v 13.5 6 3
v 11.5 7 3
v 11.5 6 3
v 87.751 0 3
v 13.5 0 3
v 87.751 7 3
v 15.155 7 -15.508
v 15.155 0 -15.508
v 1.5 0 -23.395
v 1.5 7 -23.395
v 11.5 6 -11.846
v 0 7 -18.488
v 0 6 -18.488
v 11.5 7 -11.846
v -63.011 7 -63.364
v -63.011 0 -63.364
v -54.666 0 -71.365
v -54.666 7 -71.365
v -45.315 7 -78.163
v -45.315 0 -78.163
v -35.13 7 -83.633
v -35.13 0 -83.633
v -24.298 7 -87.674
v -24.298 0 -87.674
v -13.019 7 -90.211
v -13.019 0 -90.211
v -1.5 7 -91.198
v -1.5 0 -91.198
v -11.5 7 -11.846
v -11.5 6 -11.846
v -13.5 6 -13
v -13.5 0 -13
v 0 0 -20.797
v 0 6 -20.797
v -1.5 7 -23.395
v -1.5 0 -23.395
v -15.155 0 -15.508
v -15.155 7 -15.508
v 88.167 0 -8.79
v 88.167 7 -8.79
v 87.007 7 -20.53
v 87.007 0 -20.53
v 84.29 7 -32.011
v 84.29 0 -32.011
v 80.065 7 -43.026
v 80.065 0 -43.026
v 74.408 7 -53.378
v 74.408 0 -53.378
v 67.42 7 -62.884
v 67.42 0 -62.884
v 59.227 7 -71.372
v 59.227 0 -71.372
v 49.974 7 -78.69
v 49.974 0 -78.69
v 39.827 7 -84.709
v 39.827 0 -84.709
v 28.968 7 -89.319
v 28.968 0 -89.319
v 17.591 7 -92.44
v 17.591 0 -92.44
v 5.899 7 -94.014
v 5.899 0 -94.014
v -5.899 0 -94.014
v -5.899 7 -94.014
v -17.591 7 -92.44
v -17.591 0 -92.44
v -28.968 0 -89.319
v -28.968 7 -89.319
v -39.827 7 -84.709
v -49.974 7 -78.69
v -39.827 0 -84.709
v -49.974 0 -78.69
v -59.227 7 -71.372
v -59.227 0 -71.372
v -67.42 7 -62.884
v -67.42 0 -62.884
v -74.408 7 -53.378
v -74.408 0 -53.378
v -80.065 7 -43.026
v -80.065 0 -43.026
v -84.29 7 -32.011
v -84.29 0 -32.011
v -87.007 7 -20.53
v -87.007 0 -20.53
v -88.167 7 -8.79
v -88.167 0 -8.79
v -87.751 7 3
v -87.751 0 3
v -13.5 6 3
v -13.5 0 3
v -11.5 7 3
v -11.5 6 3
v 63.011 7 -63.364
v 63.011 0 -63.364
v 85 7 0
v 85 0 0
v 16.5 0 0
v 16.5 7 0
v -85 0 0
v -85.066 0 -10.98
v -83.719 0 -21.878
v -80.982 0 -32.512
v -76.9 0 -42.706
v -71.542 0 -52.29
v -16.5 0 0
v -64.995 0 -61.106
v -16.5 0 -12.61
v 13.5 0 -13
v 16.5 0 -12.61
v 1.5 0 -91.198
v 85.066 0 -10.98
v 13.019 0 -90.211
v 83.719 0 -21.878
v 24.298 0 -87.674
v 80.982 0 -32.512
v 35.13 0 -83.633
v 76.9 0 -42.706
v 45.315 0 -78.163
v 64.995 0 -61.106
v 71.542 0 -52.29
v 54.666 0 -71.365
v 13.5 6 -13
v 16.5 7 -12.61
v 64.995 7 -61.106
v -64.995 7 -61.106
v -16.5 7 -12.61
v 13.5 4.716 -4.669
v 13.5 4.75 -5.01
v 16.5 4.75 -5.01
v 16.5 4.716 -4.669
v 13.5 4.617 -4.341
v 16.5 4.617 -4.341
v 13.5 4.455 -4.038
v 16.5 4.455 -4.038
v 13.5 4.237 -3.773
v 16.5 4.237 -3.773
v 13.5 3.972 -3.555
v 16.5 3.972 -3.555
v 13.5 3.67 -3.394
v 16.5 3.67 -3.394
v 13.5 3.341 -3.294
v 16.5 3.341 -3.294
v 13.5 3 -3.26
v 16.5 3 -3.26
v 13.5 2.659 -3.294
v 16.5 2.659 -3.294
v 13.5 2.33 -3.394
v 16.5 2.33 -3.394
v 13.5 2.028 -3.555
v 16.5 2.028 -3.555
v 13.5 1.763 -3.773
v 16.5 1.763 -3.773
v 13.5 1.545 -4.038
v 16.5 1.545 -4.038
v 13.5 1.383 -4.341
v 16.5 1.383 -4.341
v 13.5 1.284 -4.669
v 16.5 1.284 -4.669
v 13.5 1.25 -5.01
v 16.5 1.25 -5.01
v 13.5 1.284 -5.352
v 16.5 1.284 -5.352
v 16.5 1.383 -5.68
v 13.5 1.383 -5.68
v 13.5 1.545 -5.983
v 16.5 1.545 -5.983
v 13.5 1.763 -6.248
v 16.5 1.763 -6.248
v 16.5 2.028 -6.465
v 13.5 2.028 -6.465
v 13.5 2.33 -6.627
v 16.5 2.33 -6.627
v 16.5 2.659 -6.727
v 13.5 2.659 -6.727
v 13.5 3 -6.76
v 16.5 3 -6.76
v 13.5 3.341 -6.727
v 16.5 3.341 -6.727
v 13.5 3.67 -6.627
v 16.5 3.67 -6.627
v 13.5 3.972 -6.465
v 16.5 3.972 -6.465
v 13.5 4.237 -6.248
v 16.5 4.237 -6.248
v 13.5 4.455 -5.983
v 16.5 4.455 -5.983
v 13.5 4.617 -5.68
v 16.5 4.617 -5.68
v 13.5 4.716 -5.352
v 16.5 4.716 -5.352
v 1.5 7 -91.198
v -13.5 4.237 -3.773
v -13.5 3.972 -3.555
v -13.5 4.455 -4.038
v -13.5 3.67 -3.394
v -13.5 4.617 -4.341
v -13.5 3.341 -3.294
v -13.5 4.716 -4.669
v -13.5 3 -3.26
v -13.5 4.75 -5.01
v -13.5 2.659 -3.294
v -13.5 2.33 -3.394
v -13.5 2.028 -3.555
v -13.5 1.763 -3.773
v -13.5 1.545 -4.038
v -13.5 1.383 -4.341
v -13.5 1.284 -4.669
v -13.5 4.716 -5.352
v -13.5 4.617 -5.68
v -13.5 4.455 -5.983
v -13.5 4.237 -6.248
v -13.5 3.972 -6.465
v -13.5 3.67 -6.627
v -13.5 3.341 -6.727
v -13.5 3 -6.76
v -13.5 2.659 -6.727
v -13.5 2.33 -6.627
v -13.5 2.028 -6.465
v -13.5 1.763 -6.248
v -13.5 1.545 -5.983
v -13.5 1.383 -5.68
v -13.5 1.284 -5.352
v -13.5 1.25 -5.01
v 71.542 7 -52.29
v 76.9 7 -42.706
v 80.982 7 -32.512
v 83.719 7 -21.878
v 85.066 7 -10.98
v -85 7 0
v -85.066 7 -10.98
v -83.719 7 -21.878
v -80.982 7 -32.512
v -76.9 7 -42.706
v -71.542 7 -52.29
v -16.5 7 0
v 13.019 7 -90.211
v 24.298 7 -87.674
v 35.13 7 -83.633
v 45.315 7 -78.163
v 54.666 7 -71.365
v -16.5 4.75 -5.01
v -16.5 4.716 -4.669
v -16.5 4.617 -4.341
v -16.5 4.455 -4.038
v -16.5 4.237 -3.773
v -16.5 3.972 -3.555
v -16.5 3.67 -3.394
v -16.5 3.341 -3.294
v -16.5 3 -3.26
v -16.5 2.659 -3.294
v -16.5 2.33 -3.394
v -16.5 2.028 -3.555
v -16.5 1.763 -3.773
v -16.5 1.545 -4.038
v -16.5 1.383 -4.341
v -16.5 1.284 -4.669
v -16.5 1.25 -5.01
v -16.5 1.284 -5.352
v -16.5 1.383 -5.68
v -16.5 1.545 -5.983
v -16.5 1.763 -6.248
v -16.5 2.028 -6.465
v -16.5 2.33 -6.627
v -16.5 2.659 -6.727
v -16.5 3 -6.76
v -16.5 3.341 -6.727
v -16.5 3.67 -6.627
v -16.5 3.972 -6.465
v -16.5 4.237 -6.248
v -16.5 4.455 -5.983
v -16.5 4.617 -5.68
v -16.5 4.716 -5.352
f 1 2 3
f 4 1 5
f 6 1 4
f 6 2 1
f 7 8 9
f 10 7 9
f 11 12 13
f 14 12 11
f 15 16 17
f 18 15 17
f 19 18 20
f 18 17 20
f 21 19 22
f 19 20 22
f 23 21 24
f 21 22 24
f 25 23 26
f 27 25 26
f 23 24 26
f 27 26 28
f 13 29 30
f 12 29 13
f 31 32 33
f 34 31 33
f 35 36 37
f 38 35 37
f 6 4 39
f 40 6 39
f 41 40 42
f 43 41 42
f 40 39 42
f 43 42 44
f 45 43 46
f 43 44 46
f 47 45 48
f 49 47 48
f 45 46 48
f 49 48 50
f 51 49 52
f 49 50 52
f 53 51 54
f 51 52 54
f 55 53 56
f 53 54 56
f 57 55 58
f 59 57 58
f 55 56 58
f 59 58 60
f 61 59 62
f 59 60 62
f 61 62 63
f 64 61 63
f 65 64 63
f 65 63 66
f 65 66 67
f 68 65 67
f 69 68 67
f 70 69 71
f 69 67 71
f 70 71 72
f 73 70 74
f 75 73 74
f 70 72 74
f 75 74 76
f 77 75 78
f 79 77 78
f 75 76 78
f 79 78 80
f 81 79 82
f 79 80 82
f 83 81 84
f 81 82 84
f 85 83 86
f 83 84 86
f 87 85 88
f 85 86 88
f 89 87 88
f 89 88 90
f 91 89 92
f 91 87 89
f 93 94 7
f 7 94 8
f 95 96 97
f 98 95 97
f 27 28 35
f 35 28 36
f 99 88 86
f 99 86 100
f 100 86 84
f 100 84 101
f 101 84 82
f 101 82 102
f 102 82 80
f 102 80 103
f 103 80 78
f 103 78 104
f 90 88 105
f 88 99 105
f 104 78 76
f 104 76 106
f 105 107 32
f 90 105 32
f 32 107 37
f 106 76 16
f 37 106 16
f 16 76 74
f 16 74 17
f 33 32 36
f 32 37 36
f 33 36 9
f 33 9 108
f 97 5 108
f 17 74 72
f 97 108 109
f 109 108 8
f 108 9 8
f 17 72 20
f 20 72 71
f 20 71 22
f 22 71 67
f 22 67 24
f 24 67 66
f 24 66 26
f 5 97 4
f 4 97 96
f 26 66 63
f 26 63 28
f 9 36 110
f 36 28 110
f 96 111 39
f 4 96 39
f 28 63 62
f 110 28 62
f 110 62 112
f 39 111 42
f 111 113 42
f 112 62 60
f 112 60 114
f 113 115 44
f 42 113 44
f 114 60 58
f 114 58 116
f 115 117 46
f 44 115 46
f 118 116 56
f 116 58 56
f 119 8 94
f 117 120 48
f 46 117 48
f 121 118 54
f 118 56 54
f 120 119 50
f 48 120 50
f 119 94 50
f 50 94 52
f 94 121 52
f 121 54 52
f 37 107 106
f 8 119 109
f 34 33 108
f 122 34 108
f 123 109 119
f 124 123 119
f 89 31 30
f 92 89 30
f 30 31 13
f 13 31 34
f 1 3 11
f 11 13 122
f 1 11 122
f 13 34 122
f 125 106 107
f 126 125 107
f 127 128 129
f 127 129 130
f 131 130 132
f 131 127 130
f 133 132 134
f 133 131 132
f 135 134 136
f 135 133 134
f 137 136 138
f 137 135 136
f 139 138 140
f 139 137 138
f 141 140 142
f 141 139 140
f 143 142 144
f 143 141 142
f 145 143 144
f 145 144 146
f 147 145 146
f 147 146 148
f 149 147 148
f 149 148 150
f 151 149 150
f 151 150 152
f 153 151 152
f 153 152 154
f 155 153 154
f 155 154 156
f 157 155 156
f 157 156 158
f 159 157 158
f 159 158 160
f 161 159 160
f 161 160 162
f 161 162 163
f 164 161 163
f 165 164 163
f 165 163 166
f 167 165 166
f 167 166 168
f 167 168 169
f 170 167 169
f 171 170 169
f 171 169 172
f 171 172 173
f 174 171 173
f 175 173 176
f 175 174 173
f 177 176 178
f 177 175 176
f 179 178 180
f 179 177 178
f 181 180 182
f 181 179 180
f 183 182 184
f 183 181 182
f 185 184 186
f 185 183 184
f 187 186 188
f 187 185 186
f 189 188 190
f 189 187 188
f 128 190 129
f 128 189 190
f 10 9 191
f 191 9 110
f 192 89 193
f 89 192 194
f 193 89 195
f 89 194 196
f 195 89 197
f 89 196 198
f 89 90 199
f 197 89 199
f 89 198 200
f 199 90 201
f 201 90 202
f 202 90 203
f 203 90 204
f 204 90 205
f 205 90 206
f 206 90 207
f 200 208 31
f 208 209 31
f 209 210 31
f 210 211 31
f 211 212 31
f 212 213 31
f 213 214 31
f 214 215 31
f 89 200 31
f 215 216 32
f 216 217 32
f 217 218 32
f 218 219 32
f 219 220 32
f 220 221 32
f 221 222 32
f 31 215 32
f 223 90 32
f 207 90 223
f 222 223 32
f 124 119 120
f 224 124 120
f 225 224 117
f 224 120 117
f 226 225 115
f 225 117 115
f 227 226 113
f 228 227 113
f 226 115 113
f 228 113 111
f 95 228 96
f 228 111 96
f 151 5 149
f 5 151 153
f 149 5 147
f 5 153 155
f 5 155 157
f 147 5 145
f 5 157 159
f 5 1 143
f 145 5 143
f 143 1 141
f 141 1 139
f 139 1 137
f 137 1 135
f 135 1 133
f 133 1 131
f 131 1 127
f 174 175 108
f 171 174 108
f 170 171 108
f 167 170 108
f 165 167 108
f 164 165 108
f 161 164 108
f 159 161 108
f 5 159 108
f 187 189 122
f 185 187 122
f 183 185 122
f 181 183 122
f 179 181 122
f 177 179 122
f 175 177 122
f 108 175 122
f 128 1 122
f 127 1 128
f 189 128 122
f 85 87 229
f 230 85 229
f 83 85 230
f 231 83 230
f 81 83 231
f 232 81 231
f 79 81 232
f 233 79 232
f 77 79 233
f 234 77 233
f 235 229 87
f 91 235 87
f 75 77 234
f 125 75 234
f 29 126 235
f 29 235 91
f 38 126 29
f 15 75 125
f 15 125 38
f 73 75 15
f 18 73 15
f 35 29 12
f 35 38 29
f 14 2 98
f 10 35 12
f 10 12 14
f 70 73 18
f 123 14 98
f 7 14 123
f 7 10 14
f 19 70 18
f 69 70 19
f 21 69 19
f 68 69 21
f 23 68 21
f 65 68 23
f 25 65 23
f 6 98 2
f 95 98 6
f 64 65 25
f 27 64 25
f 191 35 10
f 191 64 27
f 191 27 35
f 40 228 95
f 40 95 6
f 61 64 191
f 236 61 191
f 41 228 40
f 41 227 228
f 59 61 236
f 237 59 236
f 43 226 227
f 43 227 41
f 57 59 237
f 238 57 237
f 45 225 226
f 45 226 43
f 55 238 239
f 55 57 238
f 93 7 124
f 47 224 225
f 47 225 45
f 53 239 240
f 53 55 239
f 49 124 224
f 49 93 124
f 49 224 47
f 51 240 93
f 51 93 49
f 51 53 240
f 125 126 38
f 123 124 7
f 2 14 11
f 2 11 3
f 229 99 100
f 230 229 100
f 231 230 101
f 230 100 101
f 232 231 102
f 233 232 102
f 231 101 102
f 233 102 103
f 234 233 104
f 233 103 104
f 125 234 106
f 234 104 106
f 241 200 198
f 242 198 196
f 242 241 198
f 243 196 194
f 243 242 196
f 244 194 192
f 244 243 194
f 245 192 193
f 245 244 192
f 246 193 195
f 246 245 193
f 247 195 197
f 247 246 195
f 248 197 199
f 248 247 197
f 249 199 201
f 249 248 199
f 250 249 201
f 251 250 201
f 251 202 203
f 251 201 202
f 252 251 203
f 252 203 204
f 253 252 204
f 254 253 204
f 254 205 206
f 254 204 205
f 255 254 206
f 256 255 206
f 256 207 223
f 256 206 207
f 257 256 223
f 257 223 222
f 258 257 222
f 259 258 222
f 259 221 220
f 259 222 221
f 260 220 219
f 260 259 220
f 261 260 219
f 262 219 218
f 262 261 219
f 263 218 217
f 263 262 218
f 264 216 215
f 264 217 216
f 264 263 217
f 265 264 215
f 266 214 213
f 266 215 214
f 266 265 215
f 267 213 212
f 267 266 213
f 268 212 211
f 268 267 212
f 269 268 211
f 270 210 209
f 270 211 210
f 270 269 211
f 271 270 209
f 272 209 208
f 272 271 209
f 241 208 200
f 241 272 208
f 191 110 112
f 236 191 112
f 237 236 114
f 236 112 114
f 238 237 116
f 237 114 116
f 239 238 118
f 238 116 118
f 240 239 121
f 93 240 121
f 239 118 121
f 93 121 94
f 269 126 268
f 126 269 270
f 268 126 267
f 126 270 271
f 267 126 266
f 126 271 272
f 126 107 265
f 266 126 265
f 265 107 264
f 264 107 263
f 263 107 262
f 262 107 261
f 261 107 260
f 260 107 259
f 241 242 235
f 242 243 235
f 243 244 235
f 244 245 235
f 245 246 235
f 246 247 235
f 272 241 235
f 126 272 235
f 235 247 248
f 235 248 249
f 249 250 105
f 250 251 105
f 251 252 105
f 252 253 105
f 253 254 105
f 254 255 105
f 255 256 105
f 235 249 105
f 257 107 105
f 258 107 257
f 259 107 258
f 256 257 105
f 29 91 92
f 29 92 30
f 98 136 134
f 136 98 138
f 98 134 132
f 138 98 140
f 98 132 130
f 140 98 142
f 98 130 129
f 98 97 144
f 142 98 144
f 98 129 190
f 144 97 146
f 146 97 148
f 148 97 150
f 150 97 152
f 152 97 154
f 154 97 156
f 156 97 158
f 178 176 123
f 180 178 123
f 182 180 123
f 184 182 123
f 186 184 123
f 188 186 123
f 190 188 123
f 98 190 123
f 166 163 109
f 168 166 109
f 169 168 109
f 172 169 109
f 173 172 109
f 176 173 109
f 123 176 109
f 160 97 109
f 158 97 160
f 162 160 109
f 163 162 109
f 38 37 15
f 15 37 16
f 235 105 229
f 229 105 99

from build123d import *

# Parameters (mm, degrees)
BOSS_EXTRUDE2_DEPTH                = 7
SKETCH3_W                          = 27
SKETCH3_H                          = 3
CUT_EXTRUDE2_DEPTH                 = 10
F_3_5_START                        = -16.5
F_3_5_3_5_DIAMETER_HOLE1_OUTLINE_R = 1.75
F_3_5_3_5_DIAMETER_HOLE1_DEPTH     = 33
BOSS_EXTRUDE4_DEPTH                = 1


# Read off the part's stored shape, not the designer's step: Ø3.5 (3.5) Diameter Hole1
with BuildPart() as part:
    # Sketch1 → Boss-Extrude2 (new body)
    # profile 1 of 5: a face of its own
    with BuildSketch(Plane(origin=(0, 0, 0), x_dir=(1, 0, 0), z_dir=(0, 1, 0))):
        with BuildLine():
            ThreePointArc((87.751176684, -3), (0, 94.211501571), (-87.751176684, -3))
            Line((-87.751176684, -3), (87.751176684, -3))
        make_face()
        with BuildLine():
            Line((-16.5, 0), (-85, 0))
            ThreePointArc((-85, 0), (-80.982173458, 32.512027121), (-64.995192411, 61.105580148))
            ThreePointArc((-64.995192411, 61.105580148), (-64.013019257, 62.243518432), (-63.01092574, 63.363954164))
            ThreePointArc((-63.01092574, 63.363954164), (-35.129795909, 83.633095001), (-1.5, 91.198298105))
            ThreePointArc((-1.5, 91.198298105), (0, 91.211501571), (1.5, 91.198298105))
            ThreePointArc((1.5, 91.198298105), (35.129795909, 83.633095001), (63.01092574, 63.363954164))
            ThreePointArc((63.01092574, 63.363954164), (64.013019257, 62.243518432), (64.995192411, 61.105580148))
            ThreePointArc((64.995192411, 61.105580148), (80.982173458, 32.512027121), (85, 0))
            Line((85, 0), (16.5, 0))
            Line((16.5, 0), (13.5, 0))
            Line((13.5, 0), (-13.5, 0))
            Line((-13.5, 0), (-16.5, 0))
        make_face(mode=Mode.SUBTRACT)
    # profile 2 of 5: a face of its own
    with BuildSketch(Plane(origin=(0, 0, 0), x_dir=(1, 0, 0), z_dir=(0, 1, 0))):
        with BuildLine():
            Line((16.5, 14.73170808), (16.5, 12.610387736))
            Line((16.5, 12.610387736), (64.995192411, 61.105580148))
            ThreePointArc((64.995192411, 61.105580148), (64.013019257, 62.243518432), (63.01092574, 63.363954164))
            Line((63.01092574, 63.363954164), (15.155331601, 15.508360024))
            Line((15.155331601, 15.508360024), (16.5, 14.73170808))
        make_face()
    # profile 3 of 5: a face of its own
    with BuildSketch(Plane(origin=(0, 0, 0), x_dir=(1, 0, 0), z_dir=(0, 1, 0))):
        with BuildLine():
            ThreePointArc((1.5, 91.198298105), (0, 91.211501571), (-1.5, 91.198298105))
            Line((-1.5, 91.198298105), (-1.5, 23.395389902))
            Line((-1.5, 23.395389902), (0, 24.261758084))
            Line((0, 24.261758084), (1.5, 23.395389902))
            Line((1.5, 23.395389902), (1.5, 91.198298105))
        make_face()
    # profile 4 of 5: a face of its own
    with BuildSketch(Plane(origin=(0, 0, 0), x_dir=(1, 0, 0), z_dir=(0, 1, 0))):
        with BuildLine():
            ThreePointArc((-63.01092574, 63.363954164), (-64.013019257, 62.243518432), (-64.995192411, 61.105580148))
            Line((-64.995192411, 61.105580148), (-16.5, 12.610387736))
            Line((-16.5, 12.610387736), (-16.5, 14.73170808))
            Line((-16.5, 14.73170808), (-15.155331601, 15.508360024))
            Line((-15.155331601, 15.508360024), (-63.01092574, 63.363954164))
        make_face()
    # profile 5 of 5: a face of its own
    with BuildSketch(Plane(origin=(0, 0, 0), x_dir=(1, 0, 0), z_dir=(0, 1, 0))):
        Polygon((-16.5, 12.610387736), (-16.5, 0), (-13.5, 0), (-13.5, 13), (0, 20.79731364), (13.5, 13), (13.5, 0), (16.5, 0), (16.5, 12.610387736), (16.5, 14.73170808), (15.155331601, 15.508360024), (1.5, 23.395389902), (0, 24.261758084), (-1.5, 23.395389902), (-15.155331601, 15.508360024), (-16.5, 14.73170808), align=None)
    extrude(amount=BOSS_EXTRUDE2_DEPTH)

    # Sketch3 → Cut-Extrude2 (cut)
    with BuildSketch(Plane(origin=(0, 7, 0), x_dir=(1, 0, 0), z_dir=(0, 1, 0))):
        with Locations((0, -1.5)):
            Rectangle(SKETCH3_W, SKETCH3_H)
    extrude(amount=-CUT_EXTRUDE2_DEPTH, mode=Mode.SUBTRACT)

    # Ø3.5 (3.5) Diameter Hole1 outline → Ø3.5 (3.5) Diameter Hole1 (cut)
    with BuildSketch(Plane.YZ.offset(F_3_5_START)):
        with Locations((3, -5.010387736)):
            Circle(F_3_5_3_5_DIAMETER_HOLE1_OUTLINE_R)
    extrude(amount=F_3_5_3_5_DIAMETER_HOLE1_DEPTH, mode=Mode.SUBTRACT)

    # Sketch6 → Boss-Extrude4 (add)
    with BuildSketch(Plane(origin=(0, 7, 0), x_dir=(1, 0, 0), z_dir=(0, 1, 0))):
        Polygon((11.5, 11.845527947), (11.5, -3), (13.5, -3), (13.5, 13), (0, 20.79731364), (-13.5, 13), (-13.5, -3), (-11.5, -3), (-11.5, 11.845527947), (0, 18.48768401), align=None)
    extrude(amount=-BOSS_EXTRUDE4_DEPTH)


solid = part.part
